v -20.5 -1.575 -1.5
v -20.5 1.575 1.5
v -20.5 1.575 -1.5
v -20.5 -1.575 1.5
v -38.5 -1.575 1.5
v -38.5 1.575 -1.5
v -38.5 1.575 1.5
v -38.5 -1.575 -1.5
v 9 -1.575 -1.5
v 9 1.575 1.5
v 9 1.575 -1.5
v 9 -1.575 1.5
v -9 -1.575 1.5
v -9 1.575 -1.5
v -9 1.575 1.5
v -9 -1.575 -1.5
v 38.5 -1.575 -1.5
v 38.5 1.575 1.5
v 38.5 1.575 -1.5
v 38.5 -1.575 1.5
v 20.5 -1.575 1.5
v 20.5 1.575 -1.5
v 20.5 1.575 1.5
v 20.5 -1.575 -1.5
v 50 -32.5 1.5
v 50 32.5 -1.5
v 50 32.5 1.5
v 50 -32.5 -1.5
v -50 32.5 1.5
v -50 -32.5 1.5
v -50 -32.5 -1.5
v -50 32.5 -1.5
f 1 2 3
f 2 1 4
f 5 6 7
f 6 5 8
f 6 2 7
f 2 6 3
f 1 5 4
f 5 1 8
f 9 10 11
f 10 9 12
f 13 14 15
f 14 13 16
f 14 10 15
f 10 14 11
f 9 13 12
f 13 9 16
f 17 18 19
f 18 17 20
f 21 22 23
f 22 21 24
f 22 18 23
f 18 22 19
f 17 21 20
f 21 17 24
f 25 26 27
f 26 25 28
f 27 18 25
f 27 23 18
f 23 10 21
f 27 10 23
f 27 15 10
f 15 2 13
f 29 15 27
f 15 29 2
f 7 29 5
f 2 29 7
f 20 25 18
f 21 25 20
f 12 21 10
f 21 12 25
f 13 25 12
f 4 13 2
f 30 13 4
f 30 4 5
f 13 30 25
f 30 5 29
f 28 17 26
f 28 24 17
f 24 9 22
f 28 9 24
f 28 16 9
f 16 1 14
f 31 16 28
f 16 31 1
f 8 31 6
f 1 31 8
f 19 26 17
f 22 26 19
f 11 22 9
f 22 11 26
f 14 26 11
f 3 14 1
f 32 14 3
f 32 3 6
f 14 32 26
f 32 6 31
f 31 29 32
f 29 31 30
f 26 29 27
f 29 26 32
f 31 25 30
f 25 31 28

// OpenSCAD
// ==========================================
// MAKERBENCH - LASER-CUT TAB-SLOT PANEL
// ==========================================
// Author: Senior Mechanical / DFM Engineer
// Units: mm
// Purpose: Design-for-Manufacturing (DFM) compliant laser-cut panel

// --- DFM Parameters ---
panel_width = 100.0;       // Finished outer length (X)
panel_height = 65.0;       // Finished outer width (Y)
panel_thickness = 3.0;     // Plywood material thickness (Z)

slot_length = 18.0;        // Length of rectangular slot (X)
slot_width = 3.15;         // Width of slot (Y) (3.0mm tab + 0.15mm clearance)
slot_count = 3;            // Centered horizontal slots

laser_kerf = 0.2;          // Kerf allowance reference

// --- Web and Clearance Calculations ---
// Total length occupied by the slots
total_slot_len = slot_count * slot_length;

// Compute equal spacing between slots and outer edges
web_width = (panel_width - total_slot_len) / (slot_count + 1);

// --- DFM Manifest Echo ---
// Required for makerbench automation pipeline
echo(str("MAKERBENCH-LASER2D: {",
    "\"material_thickness_mm\": ", panel_thickness, ", ",
    "\"kerf_mm\": ", laser_kerf, ", ",
    "\"slot_count\": ", slot_count, ", ",
    "\"slot_length_mm\": ", slot_length, ", ",
    "\"slot_width_mm\": ", slot_width, ", ",
    "\"min_web_mm\": ", web_width,
    "}"
));

// --- 3D Model Generation ---
module laser_cut_panel() {
    difference() {
        // Outer panel profile
        cube([panel_width, panel_height, panel_thickness], center = true);
        
        // Centered horizontal row of through-slots
        for (i = [0 : slot_count - 1]) {
            // Compute X position of each slot's center
            x_pos = -panel_width/2 + web_width + slot_length/2 + i * (slot_length + web_width);
            
            // Cutout through the thickness (expanded slightly in Z for clean CSG preview)
            translate([x_pos, 0, 0])
                cube([slot_length, slot_width, panel_thickness + 1.0], center = true);
        }
    }
}

// Render the final cut part solid
laser_cut_panel();
